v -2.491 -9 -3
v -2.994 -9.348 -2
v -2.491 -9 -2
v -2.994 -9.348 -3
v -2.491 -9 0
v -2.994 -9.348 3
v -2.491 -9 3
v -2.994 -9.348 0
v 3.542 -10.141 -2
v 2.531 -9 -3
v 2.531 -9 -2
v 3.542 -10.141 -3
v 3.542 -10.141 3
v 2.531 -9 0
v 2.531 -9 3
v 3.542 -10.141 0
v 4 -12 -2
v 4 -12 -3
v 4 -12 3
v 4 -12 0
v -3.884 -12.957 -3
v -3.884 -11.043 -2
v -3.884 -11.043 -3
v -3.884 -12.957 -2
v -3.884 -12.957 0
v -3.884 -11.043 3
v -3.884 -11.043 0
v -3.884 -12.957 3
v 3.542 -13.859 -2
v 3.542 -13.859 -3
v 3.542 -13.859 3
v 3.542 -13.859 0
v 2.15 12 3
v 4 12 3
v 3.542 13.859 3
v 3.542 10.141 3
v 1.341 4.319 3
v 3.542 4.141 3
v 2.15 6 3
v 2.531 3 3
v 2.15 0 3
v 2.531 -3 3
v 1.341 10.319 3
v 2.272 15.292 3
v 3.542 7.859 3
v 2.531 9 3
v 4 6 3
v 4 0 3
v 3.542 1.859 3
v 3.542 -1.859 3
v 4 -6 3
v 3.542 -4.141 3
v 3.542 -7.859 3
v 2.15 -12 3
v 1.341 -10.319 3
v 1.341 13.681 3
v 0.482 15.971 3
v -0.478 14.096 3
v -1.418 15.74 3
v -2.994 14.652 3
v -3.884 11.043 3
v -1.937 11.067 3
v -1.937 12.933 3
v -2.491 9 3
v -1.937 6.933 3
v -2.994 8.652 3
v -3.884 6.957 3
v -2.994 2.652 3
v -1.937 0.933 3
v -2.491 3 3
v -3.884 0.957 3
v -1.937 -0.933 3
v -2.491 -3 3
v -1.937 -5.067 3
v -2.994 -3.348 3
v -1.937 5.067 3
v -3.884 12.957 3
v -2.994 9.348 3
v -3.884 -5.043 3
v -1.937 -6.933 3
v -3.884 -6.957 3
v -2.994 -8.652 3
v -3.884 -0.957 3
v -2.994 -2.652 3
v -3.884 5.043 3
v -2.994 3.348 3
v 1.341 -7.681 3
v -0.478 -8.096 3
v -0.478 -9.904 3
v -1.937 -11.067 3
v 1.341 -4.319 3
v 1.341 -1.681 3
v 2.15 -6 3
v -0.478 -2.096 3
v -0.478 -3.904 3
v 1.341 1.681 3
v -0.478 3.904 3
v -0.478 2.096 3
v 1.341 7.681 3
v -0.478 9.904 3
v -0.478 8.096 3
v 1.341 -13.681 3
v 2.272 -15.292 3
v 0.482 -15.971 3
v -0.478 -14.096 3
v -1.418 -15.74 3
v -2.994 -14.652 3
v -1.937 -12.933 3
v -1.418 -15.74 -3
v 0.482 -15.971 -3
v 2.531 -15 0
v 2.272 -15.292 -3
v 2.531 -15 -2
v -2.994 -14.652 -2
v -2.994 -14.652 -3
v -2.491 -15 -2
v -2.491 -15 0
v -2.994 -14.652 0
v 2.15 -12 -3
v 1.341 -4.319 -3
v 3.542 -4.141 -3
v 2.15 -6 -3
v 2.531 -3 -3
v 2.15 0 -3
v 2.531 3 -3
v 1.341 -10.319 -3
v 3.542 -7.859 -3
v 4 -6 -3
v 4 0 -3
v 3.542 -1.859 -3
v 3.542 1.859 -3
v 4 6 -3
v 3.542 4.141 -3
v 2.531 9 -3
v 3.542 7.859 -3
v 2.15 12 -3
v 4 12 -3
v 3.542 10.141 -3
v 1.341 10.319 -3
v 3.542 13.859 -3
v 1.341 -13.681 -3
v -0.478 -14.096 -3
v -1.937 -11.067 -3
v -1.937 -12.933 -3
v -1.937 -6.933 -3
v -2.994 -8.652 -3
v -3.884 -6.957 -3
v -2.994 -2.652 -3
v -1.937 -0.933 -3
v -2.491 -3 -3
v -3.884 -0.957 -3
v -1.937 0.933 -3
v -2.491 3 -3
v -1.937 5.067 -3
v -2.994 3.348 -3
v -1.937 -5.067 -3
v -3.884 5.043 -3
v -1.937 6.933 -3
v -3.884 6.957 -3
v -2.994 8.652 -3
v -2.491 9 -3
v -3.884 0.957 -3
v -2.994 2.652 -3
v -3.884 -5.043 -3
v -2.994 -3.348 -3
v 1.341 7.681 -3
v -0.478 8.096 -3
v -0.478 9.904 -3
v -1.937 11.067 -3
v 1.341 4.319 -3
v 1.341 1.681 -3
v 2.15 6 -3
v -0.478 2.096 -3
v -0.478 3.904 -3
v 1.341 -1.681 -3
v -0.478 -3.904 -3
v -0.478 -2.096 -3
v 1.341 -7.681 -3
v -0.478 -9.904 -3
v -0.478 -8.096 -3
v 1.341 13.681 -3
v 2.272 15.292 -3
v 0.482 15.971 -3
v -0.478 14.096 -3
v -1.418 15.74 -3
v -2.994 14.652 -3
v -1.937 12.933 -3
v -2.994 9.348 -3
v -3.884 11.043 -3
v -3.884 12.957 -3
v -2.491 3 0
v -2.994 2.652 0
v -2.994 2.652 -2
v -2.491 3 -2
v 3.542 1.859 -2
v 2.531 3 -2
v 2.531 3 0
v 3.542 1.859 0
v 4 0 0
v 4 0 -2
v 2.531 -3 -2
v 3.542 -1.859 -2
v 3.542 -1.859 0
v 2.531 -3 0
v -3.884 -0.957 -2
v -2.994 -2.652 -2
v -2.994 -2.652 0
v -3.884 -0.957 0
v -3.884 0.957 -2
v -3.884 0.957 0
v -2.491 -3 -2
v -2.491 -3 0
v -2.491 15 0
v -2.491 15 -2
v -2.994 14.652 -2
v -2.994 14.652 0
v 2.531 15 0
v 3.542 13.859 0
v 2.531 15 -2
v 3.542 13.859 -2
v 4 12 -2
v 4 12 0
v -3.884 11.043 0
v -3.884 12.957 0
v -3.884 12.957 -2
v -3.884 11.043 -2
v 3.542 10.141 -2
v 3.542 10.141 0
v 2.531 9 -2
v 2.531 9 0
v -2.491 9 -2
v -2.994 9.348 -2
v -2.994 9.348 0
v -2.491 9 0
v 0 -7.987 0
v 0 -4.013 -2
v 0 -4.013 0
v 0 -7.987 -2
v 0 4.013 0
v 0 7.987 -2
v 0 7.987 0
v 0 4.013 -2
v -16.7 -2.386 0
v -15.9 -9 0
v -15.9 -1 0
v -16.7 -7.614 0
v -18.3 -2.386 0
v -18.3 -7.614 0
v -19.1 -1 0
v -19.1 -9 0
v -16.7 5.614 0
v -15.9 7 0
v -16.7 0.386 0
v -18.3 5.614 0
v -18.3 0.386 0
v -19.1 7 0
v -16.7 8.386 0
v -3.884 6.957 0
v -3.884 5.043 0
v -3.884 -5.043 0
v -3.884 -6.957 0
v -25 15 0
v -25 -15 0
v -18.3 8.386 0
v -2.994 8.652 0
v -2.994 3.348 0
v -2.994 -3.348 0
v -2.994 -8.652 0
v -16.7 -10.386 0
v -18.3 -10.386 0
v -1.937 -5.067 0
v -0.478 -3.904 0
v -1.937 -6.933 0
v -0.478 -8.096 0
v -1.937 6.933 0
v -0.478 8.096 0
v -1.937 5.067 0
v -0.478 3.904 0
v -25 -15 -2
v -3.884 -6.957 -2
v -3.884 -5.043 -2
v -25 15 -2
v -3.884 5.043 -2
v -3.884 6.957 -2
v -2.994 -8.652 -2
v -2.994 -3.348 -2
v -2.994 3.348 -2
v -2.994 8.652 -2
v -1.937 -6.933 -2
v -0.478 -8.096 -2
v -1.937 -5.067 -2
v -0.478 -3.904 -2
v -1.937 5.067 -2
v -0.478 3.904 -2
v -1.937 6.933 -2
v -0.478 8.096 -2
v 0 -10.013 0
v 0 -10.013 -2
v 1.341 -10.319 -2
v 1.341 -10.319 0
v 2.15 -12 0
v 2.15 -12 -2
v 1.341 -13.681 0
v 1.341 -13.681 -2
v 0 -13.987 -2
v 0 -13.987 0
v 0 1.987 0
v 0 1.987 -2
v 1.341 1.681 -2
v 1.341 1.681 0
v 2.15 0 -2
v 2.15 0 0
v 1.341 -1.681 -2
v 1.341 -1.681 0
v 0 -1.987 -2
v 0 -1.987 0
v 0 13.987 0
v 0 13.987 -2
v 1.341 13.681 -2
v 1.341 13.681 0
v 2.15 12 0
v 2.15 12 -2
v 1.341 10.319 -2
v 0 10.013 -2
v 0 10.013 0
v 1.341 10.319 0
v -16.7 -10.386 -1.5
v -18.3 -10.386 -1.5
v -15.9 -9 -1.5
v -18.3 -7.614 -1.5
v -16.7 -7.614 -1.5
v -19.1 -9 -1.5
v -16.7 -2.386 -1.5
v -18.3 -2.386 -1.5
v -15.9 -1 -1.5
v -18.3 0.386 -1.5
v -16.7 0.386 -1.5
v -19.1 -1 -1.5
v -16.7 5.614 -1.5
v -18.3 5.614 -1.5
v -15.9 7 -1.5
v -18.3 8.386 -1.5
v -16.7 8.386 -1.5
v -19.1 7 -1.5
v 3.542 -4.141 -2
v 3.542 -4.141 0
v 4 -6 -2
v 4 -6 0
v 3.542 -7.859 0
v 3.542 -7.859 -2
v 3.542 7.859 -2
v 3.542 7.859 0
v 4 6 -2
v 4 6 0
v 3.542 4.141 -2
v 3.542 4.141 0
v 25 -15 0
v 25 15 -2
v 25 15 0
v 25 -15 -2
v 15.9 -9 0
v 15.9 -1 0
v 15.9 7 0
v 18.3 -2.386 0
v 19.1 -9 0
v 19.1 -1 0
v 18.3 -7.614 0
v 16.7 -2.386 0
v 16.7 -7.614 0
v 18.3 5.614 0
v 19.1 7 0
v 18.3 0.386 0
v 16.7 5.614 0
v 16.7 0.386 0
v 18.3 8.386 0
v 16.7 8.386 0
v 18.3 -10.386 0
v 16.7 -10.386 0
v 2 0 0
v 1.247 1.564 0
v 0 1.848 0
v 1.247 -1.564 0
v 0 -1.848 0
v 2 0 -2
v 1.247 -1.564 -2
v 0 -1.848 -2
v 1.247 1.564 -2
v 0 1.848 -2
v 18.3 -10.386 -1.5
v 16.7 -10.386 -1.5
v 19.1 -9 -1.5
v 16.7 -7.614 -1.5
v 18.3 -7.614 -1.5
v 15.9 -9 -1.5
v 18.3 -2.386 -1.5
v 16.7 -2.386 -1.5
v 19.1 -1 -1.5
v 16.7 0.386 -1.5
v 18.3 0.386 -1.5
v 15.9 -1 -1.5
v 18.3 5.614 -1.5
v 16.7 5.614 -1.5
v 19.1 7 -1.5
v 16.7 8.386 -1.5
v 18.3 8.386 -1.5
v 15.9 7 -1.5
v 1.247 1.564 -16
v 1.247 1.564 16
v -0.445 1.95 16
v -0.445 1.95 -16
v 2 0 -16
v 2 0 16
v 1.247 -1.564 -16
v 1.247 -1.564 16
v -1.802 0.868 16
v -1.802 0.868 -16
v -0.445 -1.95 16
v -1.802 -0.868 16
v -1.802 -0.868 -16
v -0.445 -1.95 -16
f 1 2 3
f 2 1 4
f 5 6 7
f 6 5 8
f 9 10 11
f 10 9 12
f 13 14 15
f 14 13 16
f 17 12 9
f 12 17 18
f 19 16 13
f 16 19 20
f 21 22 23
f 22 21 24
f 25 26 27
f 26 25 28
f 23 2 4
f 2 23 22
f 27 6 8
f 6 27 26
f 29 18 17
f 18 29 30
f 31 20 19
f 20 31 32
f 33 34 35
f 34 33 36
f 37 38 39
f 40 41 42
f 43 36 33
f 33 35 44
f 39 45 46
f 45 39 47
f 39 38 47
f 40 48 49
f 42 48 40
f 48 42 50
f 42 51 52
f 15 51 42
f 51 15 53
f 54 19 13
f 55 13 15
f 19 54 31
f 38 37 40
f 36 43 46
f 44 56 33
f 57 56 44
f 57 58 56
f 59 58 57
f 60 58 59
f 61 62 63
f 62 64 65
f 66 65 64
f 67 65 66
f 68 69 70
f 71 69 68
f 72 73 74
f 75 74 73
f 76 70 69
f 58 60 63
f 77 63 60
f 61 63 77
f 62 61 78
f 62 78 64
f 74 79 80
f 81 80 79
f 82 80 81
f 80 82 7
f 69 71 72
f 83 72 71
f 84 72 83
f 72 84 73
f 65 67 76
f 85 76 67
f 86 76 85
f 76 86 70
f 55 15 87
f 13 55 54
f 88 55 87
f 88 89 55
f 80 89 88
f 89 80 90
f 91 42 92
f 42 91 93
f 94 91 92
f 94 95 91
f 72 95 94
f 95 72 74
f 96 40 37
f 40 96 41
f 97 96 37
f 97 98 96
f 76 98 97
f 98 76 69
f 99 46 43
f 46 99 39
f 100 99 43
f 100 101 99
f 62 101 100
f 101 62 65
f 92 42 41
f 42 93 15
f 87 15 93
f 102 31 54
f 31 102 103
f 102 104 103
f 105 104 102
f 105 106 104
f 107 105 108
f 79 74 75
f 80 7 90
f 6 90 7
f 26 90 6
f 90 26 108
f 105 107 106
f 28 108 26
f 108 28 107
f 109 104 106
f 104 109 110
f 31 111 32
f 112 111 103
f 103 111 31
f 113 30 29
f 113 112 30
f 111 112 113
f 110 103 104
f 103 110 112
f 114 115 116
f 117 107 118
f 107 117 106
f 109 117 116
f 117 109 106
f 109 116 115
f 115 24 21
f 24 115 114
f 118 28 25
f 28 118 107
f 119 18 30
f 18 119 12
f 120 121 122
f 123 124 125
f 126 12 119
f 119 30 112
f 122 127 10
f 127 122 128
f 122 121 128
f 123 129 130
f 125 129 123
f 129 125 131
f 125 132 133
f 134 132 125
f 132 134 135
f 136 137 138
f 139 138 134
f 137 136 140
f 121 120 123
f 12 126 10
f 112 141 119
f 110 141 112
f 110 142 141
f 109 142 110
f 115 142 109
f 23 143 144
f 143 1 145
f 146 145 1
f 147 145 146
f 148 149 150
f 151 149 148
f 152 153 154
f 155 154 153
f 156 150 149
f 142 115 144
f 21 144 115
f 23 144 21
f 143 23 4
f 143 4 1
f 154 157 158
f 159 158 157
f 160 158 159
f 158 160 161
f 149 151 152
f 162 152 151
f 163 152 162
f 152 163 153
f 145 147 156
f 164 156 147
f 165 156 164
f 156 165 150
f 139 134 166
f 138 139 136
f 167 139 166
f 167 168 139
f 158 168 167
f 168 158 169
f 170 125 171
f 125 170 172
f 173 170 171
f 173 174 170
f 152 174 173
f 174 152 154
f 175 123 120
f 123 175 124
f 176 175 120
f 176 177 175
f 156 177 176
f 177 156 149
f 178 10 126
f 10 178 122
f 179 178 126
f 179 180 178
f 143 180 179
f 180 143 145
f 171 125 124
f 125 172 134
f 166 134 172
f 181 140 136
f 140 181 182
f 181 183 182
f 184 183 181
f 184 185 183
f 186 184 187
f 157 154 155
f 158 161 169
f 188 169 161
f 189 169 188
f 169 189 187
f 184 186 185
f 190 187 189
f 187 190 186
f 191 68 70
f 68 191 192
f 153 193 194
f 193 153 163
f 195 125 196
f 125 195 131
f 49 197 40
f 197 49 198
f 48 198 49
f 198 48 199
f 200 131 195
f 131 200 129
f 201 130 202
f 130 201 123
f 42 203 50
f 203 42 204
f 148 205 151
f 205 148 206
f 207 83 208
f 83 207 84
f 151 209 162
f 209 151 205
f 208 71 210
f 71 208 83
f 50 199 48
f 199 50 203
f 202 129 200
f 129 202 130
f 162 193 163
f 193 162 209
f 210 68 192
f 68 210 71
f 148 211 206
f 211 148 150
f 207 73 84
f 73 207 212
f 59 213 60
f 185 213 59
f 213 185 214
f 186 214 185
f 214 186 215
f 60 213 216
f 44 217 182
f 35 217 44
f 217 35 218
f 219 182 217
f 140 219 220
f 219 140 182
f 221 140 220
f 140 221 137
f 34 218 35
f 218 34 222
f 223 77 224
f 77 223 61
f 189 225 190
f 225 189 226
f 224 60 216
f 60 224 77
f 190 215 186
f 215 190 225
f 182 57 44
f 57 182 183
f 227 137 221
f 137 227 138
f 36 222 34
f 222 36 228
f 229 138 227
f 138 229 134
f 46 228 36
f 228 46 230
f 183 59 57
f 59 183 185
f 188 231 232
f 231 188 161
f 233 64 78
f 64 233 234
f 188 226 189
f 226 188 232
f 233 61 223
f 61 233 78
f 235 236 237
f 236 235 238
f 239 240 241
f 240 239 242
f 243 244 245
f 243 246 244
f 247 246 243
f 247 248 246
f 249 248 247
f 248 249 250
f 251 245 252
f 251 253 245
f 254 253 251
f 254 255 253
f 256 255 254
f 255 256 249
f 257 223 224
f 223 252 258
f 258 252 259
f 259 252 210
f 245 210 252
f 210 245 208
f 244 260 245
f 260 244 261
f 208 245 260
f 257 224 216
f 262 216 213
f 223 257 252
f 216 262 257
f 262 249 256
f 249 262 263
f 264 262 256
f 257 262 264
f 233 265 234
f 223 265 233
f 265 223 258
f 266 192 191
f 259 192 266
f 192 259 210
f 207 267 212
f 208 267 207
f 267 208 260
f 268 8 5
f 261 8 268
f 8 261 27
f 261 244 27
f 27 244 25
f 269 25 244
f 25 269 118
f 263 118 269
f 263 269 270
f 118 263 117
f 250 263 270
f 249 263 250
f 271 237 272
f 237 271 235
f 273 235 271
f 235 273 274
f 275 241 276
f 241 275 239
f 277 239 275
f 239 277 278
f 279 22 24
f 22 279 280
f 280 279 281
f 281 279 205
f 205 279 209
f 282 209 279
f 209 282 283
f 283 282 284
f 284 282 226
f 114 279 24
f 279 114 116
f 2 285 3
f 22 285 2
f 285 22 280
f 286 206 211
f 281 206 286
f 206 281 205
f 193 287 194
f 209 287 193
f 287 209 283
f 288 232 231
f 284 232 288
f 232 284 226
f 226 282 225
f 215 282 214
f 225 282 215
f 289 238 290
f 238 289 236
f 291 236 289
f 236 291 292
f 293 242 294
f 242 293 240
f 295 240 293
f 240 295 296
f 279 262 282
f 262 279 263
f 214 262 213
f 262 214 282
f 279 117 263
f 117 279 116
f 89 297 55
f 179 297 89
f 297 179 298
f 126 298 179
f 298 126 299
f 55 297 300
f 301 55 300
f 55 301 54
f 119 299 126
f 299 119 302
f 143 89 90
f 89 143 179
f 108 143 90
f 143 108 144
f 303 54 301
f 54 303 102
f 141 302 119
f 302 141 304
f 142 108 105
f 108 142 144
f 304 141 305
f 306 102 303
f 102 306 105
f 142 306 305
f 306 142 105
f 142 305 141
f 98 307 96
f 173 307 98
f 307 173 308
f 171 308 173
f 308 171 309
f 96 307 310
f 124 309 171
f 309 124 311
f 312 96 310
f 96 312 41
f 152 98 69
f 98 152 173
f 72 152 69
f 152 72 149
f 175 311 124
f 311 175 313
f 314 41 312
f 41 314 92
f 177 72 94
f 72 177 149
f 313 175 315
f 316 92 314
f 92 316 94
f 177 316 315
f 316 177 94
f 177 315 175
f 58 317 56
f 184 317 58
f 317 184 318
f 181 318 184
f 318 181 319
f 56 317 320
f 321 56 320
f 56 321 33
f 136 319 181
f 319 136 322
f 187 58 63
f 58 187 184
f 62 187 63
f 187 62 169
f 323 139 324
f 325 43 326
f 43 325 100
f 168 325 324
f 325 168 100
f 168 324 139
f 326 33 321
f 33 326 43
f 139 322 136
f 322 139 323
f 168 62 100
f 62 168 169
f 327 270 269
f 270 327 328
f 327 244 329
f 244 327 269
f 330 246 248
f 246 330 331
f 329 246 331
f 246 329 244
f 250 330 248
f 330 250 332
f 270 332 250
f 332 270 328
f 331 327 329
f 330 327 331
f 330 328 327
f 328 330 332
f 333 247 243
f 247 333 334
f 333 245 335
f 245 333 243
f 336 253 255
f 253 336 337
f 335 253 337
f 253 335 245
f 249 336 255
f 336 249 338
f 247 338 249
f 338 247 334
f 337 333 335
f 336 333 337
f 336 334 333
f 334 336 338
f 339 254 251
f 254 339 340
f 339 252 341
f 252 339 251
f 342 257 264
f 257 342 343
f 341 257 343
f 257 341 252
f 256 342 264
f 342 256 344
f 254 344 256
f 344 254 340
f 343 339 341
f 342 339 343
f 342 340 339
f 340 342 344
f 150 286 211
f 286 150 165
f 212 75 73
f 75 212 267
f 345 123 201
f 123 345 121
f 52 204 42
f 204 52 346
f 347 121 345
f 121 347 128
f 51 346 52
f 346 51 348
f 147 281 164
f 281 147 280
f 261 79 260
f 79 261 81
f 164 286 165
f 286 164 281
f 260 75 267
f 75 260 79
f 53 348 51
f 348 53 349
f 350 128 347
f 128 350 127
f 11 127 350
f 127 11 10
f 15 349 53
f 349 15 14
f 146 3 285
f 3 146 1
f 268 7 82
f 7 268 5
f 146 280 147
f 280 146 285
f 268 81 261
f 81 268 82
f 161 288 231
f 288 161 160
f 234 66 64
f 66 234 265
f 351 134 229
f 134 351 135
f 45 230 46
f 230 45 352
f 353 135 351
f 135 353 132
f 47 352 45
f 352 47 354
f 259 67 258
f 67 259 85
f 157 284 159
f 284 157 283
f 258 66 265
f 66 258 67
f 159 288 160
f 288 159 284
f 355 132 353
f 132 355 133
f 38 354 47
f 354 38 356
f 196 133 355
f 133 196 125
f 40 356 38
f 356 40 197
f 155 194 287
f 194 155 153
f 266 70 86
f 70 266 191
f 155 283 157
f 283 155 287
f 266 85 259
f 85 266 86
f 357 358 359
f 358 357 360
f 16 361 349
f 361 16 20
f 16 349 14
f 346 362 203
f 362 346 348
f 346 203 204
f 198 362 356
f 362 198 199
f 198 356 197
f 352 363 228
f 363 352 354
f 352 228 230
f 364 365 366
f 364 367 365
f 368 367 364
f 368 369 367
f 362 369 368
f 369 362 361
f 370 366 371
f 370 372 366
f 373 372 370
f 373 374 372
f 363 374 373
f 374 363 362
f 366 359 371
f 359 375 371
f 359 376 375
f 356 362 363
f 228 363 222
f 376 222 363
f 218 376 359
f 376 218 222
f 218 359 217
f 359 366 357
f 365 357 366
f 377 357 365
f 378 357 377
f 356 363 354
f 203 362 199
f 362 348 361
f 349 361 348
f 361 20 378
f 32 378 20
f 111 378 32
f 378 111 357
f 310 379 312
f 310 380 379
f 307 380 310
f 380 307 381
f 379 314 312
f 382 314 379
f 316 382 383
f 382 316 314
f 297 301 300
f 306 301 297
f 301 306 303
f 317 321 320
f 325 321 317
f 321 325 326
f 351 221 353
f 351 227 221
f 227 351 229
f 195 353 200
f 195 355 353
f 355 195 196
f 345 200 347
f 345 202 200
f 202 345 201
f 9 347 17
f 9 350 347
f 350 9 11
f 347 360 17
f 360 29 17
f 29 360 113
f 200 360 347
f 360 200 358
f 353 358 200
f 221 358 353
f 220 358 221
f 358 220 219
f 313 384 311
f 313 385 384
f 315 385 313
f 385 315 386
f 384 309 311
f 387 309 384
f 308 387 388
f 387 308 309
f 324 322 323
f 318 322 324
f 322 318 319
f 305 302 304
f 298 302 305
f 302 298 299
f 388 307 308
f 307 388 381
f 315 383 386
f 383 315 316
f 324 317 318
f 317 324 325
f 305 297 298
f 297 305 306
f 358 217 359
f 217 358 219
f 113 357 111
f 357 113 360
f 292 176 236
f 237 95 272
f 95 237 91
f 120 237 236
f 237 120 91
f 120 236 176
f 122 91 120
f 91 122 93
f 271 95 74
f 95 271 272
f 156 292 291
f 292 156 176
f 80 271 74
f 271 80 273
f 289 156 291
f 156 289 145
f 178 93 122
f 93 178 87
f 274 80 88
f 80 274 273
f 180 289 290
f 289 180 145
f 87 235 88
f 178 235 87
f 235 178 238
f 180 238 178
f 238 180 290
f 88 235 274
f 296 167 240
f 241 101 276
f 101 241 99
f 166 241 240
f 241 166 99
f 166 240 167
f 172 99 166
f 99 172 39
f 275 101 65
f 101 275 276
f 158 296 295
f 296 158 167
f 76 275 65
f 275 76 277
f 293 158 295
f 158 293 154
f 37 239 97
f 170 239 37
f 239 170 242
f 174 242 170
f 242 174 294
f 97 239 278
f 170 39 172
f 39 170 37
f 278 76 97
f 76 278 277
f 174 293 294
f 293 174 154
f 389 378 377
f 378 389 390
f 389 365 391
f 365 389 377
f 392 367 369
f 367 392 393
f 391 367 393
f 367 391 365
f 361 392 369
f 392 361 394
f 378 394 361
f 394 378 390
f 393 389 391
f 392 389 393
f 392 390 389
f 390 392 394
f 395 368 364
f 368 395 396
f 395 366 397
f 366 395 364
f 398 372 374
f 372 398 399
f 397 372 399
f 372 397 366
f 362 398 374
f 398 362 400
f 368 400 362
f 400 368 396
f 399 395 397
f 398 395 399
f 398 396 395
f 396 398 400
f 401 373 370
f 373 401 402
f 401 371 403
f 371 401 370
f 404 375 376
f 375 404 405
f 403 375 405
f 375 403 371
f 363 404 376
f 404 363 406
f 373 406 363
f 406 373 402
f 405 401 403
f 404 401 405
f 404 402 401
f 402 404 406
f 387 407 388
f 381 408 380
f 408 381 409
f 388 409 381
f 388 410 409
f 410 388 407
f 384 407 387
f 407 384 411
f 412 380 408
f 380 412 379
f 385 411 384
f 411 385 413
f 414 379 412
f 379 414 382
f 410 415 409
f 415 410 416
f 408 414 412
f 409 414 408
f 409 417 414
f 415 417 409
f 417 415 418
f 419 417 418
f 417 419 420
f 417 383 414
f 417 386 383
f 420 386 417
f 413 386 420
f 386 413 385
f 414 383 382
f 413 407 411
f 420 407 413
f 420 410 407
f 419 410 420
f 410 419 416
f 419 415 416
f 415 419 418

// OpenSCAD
// バット蝶番（180°開いた状態）

// パラメータ
leaf_width = 25;    // 板の幅
leaf_height = 30;   // 板の高さ
leaf_thickness = 2; // 板の厚み
knuckle_od = 8;     // knuckle外径
pin_diameter = 4;   // ピン軸径
pin_clearance = 0.3; // ピンクリアランス
knuckle_id = pin_diameter + pin_clearance; // knuckle内径
pin_length = 32;    // ピン軸長さ
knuckle_length = 6; // 各knuckle長さ

// 皿穴パラメータ
screw_hole_dia = 3.2;
countersink_dia = 6;
countersink_depth = 1;
screw_spacing = 8;

module leaf_with_knuckles(knuckle_positions, side) {
    difference() {
        union() {
            // メイン板
            translate([side * leaf_width/2, 0, -leaf_thickness/2])
                cube([leaf_width, leaf_height, leaf_thickness], center=true);
            
            // knuckles
            for (pos = knuckle_positions) {
                translate([0, pos, 0])
                    cylinder(h=knuckle_length, d=knuckle_od, center=true);
            }
        }
        
        // knuckle穴（ピン軸用）
        for (pos = knuckle_positions) {
            translate([0, pos, 0])
                cylinder(h=knuckle_length+0.1, d=knuckle_id, center=true);
        }
        
        // 皿穴
        for (i = [0:2]) {
            screw_y = -leaf_height/2 + 6 + i * screw_spacing;
            translate([side * leaf_width * 0.7, screw_y, 0]) {
                // 貫通穴
                cylinder(h=leaf_thickness+1, d=screw_hole_dia, center=true);
                // 皿穴（表面側）
                translate([0, 0, leaf_thickness/2 - countersink_depth + 0.1])
                    cylinder(h=countersink_depth+0.1, d1=screw_hole_dia, d2=countersink_dia);
            }
        }
    }
}

// knuckle位置（Y座標、30mmを5等分）
// -12, -6, 0, 6, 12 (各6mm間隔)

// 左板（x<0側、knuckle位置: 1番目、3番目、5番目）
left_knuckle_positions = [-12, 0, 12];
leaf_with_knuckles(left_knuckle_positions, -1);

// 右板（x>0側、knuckle位置: 2番目、4番目）
right_knuckle_positions = [-6, 6];
leaf_with_knuckles(right_knuckle_positions, 1);

// ピン軸（Y軸方向）
cylinder(h=pin_length, d=pin_diameter, center=true);
